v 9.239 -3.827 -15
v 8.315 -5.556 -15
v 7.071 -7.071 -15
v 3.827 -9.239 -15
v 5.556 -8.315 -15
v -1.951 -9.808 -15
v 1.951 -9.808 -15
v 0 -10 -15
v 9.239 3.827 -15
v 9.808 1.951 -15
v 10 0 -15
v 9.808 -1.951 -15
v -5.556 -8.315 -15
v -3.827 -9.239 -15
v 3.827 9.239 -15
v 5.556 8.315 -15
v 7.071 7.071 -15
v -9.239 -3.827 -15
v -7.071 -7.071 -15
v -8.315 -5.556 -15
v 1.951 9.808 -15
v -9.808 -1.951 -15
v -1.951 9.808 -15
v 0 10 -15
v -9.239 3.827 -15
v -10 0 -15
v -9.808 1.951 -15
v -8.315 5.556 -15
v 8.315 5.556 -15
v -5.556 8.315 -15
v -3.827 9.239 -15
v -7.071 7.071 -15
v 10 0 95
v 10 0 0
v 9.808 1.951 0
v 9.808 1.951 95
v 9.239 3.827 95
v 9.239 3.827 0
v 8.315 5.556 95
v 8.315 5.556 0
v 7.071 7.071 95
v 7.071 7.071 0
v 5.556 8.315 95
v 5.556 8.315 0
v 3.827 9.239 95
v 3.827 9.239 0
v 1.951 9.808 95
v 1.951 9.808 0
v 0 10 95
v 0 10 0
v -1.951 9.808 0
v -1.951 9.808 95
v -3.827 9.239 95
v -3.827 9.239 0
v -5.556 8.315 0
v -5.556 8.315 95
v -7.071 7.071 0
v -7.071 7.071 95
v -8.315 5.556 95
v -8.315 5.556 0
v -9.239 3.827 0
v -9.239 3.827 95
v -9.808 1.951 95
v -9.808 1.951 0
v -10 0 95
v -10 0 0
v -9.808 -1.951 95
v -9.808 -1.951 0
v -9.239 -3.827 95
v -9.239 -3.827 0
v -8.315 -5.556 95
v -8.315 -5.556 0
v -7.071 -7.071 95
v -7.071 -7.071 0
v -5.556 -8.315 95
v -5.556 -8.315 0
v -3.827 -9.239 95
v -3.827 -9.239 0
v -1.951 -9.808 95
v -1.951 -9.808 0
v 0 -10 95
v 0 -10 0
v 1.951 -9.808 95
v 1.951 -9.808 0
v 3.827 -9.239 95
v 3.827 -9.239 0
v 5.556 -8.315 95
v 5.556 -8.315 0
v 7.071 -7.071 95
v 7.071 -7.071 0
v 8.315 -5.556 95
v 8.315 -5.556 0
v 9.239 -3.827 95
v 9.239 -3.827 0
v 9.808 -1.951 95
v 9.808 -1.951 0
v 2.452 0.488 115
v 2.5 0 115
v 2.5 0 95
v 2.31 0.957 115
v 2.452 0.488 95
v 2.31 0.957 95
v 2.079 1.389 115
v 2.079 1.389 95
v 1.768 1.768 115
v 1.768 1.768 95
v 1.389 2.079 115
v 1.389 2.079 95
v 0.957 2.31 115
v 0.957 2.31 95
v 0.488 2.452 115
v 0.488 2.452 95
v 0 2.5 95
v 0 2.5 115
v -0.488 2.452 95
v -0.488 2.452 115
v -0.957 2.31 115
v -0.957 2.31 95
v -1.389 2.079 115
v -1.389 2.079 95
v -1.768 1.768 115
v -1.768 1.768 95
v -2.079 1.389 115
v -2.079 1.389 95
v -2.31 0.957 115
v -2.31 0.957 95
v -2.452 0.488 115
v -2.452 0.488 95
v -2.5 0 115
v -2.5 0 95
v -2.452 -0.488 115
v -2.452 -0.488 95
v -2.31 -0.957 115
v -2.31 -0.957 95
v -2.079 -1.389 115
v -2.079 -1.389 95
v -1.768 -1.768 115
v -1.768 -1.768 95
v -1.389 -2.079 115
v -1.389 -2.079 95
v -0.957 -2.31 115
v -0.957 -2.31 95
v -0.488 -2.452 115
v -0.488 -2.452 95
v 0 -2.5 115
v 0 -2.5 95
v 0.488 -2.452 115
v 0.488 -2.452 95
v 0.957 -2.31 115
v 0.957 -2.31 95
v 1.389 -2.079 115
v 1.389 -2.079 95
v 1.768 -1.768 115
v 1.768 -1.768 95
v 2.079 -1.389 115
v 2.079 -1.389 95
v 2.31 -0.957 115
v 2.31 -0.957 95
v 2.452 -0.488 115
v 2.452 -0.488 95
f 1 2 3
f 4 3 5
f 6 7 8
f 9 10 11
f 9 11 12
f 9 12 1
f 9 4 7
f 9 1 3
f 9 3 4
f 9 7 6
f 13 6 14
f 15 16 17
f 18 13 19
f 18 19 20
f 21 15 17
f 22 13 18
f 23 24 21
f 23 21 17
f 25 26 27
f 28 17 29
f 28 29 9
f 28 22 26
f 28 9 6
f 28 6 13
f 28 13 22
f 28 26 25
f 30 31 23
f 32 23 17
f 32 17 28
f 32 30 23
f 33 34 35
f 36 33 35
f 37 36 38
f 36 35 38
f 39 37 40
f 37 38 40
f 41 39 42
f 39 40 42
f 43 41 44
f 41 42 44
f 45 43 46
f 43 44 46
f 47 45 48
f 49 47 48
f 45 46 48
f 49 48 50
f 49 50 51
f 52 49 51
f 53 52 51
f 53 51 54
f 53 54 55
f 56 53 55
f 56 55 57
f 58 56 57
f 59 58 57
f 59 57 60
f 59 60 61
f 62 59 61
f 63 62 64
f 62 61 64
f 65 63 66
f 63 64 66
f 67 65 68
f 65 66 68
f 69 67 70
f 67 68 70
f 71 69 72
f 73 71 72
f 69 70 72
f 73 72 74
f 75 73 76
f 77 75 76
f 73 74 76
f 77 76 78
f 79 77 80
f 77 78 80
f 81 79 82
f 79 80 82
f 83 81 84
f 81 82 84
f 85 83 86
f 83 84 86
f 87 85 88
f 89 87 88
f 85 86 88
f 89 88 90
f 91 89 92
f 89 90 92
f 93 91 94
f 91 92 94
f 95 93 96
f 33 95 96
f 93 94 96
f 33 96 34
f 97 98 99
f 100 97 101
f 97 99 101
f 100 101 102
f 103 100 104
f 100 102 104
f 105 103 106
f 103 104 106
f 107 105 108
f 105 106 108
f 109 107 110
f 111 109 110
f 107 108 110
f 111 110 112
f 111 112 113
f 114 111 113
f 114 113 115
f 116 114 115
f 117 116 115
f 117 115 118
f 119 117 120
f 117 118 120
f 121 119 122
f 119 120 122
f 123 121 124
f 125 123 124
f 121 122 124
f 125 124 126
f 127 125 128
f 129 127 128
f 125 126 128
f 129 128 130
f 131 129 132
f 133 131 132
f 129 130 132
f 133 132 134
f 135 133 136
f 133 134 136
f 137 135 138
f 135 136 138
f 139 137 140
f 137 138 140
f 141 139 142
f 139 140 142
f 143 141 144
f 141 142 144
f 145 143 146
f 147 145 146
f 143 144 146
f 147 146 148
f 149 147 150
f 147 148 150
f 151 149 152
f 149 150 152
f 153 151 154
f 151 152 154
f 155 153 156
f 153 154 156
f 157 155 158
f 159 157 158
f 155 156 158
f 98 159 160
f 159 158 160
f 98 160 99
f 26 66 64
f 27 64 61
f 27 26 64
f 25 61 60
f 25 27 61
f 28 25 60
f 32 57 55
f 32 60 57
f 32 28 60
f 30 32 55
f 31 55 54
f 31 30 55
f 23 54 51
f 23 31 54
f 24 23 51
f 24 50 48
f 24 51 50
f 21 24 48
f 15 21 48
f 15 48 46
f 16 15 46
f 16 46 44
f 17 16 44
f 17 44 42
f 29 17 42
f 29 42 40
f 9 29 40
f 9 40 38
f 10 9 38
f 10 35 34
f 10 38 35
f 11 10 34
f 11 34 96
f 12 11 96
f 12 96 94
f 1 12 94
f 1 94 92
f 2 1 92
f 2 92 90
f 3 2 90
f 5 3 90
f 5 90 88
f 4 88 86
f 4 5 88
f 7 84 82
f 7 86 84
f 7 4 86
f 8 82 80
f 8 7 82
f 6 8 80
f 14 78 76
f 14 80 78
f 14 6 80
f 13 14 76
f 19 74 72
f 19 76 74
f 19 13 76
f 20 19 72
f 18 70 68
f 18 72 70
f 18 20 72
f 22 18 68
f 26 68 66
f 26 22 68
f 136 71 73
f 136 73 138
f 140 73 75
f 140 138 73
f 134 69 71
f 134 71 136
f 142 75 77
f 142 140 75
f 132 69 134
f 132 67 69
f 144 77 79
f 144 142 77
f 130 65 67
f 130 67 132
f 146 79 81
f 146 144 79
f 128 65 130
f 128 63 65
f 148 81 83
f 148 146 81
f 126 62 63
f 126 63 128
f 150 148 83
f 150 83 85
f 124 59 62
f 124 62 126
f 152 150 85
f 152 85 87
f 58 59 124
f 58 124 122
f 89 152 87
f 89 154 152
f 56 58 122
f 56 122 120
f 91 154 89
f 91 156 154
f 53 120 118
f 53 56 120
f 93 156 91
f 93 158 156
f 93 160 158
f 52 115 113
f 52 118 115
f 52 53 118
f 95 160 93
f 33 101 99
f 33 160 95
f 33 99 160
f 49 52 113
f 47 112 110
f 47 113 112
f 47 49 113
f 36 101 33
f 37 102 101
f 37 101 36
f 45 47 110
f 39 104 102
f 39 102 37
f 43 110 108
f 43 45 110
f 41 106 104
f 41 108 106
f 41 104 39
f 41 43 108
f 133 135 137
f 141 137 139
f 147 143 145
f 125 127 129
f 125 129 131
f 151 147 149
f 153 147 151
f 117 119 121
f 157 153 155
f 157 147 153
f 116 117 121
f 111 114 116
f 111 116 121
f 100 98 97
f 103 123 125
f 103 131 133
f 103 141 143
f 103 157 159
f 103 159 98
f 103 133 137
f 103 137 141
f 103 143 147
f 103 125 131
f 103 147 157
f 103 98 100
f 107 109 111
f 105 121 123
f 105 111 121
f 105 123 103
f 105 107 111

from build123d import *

# Parameters (mm, degrees)
SKETCH2_R           = 10
BOSS_EXTRUDE1_DEPTH = 95
BOSS_EXTRUDE2_START = 15
SKETCH3_R           = 10
BOSS_EXTRUDE2_DEPTH = 15
SKETCH5_R           = 2.5
BOSS_EXTRUDE3_DEPTH = 20


with BuildPart() as part:
    # Sketch2 → Boss-Extrude1 (new body)
    with BuildSketch(Plane.XY):
        Circle(SKETCH2_R)
    extrude(amount=BOSS_EXTRUDE1_DEPTH)

    # Sketch3 → Boss-Extrude2 (add)
    with BuildSketch(Plane(origin=(0, 0, 0), x_dir=(-1, 0, 0), z_dir=(0, 0, -1)).offset(BOSS_EXTRUDE2_START)):
        Circle(SKETCH3_R)
    extrude(amount=-BOSS_EXTRUDE2_DEPTH)

    # Sketch5 → Boss-Extrude3 (add)
    with BuildSketch(Plane.XY.offset(95)):
        Circle(SKETCH5_R)
    extrude(amount=BOSS_EXTRUDE3_DEPTH)


solid = part.part
